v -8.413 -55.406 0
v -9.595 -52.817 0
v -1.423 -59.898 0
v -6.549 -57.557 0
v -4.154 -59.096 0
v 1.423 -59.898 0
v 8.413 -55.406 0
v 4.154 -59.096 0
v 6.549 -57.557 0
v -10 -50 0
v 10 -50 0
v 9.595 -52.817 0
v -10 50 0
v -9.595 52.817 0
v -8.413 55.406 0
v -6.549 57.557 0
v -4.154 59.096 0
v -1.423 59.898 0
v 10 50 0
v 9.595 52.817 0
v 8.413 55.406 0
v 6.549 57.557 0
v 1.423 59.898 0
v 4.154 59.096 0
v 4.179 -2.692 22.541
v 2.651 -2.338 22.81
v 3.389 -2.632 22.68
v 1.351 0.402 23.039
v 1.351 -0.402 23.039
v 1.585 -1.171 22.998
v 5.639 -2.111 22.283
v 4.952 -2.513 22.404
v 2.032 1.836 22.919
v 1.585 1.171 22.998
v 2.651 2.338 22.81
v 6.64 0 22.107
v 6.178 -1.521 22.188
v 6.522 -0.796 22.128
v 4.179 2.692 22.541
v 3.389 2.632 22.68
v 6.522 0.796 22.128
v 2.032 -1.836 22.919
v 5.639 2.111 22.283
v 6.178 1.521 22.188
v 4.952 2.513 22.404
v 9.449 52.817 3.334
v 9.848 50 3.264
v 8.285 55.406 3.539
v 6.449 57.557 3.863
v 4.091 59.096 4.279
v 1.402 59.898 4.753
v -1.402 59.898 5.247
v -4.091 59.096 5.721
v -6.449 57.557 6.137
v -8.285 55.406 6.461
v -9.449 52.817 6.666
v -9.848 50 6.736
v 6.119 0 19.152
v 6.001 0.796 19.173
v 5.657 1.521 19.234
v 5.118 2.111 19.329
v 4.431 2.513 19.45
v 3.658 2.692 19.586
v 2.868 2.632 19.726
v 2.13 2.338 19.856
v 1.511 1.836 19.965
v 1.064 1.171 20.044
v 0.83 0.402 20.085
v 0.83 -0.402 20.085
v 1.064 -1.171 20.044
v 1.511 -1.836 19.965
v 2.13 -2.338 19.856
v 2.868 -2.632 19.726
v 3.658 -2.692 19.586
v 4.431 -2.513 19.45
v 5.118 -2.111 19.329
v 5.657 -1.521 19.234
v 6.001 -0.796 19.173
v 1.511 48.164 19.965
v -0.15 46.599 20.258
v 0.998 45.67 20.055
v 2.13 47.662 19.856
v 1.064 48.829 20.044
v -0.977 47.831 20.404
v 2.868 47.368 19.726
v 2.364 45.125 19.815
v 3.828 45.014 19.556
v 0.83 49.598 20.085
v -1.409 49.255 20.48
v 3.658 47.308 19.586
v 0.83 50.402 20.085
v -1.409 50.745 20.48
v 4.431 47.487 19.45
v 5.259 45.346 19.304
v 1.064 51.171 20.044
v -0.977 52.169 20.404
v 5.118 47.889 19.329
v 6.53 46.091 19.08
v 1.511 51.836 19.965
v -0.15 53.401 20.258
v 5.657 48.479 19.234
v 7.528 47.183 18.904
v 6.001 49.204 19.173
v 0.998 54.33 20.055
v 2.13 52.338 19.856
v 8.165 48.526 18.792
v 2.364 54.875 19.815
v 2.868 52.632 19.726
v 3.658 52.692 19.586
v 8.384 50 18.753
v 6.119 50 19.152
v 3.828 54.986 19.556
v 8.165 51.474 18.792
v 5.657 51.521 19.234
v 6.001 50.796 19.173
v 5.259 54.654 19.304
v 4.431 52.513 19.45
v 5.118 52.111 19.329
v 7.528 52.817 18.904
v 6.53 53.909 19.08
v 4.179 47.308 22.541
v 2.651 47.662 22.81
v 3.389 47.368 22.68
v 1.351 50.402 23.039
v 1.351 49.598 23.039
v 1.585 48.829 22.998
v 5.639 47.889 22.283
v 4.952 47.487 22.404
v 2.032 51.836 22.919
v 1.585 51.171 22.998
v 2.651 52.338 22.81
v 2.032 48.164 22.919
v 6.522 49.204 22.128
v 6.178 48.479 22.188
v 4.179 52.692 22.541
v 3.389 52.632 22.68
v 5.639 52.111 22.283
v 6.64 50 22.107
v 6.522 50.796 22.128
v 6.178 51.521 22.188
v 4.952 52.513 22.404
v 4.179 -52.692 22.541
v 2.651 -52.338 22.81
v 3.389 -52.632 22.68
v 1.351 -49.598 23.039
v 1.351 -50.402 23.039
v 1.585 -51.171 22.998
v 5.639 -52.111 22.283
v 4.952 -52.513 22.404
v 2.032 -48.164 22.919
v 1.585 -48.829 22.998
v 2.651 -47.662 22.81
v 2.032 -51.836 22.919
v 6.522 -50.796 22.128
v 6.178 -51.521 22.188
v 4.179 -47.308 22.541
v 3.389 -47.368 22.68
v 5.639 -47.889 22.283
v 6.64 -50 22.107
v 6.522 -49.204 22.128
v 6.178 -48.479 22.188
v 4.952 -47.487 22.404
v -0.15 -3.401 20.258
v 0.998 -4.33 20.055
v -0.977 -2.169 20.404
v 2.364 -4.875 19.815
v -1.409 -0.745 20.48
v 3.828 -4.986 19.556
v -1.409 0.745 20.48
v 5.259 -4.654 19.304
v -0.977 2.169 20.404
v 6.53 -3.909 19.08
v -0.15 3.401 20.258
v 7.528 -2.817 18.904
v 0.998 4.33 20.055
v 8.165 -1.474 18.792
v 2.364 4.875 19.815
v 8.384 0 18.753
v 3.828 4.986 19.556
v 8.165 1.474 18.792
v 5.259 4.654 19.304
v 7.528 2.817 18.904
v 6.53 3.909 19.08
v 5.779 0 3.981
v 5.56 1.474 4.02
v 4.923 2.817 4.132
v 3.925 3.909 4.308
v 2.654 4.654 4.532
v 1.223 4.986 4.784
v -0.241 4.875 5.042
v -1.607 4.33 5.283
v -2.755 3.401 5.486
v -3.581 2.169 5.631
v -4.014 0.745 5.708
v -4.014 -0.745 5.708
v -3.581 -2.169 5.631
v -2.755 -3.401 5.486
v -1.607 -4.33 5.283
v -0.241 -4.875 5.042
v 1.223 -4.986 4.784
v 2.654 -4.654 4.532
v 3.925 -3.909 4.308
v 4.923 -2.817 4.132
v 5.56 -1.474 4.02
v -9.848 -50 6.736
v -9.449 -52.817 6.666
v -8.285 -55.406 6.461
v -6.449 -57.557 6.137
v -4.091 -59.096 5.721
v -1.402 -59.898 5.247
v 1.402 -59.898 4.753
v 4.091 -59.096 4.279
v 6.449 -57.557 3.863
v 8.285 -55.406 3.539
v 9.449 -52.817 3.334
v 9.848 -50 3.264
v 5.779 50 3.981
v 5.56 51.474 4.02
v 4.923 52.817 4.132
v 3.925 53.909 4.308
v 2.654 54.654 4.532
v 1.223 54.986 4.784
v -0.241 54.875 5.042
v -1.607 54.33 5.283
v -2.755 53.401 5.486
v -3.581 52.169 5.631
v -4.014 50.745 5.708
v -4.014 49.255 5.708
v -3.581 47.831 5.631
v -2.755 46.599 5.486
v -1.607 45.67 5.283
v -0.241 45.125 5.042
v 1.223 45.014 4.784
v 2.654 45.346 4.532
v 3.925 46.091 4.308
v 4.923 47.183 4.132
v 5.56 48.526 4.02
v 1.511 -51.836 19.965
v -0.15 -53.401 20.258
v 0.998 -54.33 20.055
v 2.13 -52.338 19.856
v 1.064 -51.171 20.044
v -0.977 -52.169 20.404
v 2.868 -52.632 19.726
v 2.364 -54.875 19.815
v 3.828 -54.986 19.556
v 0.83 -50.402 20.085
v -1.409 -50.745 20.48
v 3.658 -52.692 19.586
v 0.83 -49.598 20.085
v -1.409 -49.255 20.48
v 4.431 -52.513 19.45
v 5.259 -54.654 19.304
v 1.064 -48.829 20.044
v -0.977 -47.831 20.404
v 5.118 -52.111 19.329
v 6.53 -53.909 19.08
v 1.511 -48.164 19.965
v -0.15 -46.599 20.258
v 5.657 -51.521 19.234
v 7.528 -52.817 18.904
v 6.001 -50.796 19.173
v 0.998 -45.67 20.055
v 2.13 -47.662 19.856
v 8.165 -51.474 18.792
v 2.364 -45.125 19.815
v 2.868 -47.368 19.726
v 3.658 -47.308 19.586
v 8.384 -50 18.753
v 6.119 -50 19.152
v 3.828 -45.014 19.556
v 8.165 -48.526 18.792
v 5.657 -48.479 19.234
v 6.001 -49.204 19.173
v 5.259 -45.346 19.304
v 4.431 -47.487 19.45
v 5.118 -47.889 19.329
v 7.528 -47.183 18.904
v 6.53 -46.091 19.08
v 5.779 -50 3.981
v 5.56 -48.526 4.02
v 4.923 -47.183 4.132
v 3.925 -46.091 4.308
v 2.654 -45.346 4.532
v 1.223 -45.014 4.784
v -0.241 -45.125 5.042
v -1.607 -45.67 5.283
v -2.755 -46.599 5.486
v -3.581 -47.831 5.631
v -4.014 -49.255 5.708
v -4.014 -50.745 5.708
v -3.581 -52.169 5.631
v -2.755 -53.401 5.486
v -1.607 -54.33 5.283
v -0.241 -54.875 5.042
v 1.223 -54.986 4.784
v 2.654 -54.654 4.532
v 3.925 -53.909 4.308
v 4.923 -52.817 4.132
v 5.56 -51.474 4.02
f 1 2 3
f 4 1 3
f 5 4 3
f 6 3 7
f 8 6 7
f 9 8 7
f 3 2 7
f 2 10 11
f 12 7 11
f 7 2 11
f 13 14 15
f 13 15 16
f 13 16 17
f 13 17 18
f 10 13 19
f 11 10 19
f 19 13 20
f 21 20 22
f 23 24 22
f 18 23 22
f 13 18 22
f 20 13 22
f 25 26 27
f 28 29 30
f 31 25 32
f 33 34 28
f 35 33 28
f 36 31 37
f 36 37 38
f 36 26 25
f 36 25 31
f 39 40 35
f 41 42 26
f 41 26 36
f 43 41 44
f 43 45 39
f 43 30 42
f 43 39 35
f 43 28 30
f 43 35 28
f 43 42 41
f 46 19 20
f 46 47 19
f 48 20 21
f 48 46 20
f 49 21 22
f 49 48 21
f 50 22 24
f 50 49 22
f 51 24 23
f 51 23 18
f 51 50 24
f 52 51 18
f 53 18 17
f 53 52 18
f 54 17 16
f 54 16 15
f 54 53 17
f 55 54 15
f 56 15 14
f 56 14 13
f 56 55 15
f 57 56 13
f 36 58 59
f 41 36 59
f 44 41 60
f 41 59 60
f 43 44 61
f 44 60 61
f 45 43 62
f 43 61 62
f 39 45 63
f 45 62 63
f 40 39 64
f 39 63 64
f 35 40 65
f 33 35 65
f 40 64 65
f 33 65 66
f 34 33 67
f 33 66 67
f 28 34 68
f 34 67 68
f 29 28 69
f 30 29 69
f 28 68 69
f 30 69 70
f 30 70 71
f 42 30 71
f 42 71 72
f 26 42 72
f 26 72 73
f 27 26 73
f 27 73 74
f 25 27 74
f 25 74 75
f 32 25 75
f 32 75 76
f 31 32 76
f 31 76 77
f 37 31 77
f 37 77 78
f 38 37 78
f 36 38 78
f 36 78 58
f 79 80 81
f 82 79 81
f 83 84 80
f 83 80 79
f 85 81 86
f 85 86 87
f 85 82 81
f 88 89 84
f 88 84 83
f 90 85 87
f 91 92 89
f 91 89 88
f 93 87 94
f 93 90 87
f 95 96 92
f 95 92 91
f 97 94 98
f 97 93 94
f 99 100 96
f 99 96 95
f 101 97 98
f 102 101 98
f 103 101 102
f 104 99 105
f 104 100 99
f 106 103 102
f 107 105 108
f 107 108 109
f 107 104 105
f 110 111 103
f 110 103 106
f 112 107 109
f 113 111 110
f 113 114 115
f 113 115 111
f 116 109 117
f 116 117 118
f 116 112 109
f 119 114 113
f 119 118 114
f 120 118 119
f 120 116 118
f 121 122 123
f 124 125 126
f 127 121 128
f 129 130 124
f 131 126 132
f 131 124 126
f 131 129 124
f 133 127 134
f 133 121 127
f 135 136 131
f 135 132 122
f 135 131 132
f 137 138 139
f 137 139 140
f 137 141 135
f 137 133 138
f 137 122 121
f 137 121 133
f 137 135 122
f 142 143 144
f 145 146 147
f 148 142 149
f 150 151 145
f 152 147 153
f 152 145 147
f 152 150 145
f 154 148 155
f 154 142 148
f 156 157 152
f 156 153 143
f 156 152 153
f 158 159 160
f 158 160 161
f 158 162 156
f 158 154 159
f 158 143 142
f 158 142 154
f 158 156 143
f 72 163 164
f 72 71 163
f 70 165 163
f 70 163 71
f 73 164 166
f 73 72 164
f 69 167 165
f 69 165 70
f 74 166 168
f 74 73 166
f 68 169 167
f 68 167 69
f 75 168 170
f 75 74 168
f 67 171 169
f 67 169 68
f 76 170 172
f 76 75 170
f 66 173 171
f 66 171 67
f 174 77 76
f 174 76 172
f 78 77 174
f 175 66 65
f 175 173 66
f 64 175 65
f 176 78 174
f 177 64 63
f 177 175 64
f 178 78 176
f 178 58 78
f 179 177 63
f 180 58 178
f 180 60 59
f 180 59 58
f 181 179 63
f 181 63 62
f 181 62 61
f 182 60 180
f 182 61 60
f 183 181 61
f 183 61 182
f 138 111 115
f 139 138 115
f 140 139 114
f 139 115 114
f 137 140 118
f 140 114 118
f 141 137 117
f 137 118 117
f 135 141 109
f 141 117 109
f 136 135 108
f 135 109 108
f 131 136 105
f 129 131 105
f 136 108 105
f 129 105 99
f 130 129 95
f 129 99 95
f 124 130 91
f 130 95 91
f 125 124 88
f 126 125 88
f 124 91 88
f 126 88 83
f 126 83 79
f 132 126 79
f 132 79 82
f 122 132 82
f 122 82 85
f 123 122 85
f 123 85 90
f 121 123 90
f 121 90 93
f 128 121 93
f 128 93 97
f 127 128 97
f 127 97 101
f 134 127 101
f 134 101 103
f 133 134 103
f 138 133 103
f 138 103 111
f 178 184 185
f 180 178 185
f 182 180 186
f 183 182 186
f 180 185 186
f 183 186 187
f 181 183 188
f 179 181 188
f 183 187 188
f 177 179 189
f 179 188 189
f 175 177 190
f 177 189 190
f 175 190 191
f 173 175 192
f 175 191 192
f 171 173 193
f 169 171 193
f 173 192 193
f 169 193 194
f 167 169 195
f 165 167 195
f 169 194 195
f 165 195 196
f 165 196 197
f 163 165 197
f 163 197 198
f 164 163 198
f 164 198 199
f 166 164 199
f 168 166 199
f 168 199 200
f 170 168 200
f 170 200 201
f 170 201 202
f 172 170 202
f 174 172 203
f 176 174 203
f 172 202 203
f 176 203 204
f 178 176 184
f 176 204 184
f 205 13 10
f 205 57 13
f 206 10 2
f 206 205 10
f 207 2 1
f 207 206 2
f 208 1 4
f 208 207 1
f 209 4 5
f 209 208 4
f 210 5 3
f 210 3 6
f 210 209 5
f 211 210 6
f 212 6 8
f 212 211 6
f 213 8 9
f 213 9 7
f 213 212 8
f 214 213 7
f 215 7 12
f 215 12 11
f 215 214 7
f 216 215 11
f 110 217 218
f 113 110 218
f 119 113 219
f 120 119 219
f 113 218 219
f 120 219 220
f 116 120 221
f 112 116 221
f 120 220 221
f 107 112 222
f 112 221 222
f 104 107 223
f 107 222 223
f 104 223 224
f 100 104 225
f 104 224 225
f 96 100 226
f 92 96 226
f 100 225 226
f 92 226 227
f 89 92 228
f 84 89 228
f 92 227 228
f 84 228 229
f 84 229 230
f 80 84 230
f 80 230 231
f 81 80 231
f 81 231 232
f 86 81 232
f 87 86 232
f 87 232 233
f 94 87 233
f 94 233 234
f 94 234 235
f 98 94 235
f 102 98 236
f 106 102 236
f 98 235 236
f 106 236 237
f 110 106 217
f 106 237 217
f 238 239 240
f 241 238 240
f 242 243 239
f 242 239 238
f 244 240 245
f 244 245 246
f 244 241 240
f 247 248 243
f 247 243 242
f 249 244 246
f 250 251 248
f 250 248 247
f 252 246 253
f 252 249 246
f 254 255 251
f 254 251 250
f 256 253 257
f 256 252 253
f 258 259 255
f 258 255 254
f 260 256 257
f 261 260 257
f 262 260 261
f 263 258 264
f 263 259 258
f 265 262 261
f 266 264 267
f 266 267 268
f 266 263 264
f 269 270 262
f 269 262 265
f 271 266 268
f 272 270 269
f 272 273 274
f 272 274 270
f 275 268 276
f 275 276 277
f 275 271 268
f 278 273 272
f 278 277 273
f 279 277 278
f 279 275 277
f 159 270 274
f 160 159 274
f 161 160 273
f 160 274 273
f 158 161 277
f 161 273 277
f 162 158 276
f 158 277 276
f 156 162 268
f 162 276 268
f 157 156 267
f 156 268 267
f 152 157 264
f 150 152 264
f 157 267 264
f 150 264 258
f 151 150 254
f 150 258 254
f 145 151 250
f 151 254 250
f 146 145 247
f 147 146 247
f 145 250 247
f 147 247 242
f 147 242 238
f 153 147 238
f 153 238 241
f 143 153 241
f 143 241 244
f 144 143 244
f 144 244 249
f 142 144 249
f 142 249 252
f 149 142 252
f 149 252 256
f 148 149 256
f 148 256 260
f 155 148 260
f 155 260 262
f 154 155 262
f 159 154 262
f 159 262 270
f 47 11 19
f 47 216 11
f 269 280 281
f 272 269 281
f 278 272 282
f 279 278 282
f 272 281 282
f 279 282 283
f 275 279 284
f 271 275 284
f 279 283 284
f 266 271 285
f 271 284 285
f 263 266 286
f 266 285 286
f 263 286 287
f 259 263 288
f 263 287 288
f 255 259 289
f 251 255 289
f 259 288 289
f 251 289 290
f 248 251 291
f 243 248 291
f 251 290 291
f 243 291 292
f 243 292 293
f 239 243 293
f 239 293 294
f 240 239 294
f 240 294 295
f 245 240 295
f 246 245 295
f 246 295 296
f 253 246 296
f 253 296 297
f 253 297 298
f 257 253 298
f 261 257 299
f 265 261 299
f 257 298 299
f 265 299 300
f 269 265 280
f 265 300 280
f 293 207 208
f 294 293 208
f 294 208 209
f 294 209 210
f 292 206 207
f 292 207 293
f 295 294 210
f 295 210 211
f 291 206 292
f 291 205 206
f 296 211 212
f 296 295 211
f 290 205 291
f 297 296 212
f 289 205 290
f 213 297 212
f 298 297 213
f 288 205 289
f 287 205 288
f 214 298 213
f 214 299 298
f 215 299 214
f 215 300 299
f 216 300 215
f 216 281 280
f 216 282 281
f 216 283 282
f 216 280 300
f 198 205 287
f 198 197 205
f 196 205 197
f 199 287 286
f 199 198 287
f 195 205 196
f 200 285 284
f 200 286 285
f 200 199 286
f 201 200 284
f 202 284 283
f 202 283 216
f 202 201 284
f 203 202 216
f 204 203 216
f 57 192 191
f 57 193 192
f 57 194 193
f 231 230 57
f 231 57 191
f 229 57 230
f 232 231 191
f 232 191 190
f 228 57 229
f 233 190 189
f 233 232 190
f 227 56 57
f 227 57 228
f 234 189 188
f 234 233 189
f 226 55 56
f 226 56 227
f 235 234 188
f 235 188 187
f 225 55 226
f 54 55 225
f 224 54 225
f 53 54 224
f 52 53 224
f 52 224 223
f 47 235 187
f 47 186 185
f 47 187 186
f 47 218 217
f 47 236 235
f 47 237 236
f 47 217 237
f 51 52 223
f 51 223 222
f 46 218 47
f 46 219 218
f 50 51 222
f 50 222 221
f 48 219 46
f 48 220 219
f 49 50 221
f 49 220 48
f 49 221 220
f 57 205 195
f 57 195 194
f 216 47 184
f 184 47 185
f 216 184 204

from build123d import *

# Parameters (mm, degrees)
SKETCH033_R  = 5
PAD010_DEPTH = 15
SKETCH035_R  = 2.7
PAD011_DEPTH = 18


with BuildPart() as part:
    # Sketch032 → AdditiveLoft section 0
    with BuildSketch(Plane.XY):
        with BuildLine():
            ThreePointArc((10, 50), (0, 60), (-10, 50))
            Line((-10, 50), (-10, -50))
            ThreePointArc((-10, -50), (0, -60), (10, -50))
            Line((10, 50), (10, -50))
        make_face()
    # Sketch034 → AdditiveLoft section 1
    with BuildSketch(Plane(origin=(0, 0, 5), x_dir=(0.984808, 0, -0.173648), z_dir=(0.173648, 0, 0.984808))):
        with BuildLine():
            ThreePointArc((10, 50), (0, 60), (-10, 50))
            Line((-10, 50), (-10, -50))
            ThreePointArc((-10, -50), (0, -60), (10, -50))
            Line((10, 50), (10, -50))
        make_face()
    loft()

    # Sketch033 (on Face3 of AdditiveLoft) → Pad010 (new body)
    with BuildSketch(Plane(origin=(0.85505, 0, 4.849232), x_dir=(0.984808, 0, -0.173648), z_dir=(0.173648, 0, 0.984808))):
        with Locations((0, 50)):
            Circle(SKETCH033_R)
        with Locations((0, -50)):
            Circle(SKETCH033_R)
        Circle(SKETCH033_R)
    extrude(amount=PAD010_DEPTH)

    # Sketch035 (on Face3 of AdditiveLoft) → Pad011 (join)
    with BuildSketch(Plane(origin=(0.85505, 0, 4.849232), x_dir=(0.984808, 0, -0.173648), z_dir=(0.173648, 0, 0.984808))):
        with Locations((0, 50)):
            Circle(SKETCH035_R)
        with Locations((0, -50)):
            Circle(SKETCH035_R)
        Circle(SKETCH035_R)
    extrude(amount=PAD011_DEPTH)


solid = part.part
